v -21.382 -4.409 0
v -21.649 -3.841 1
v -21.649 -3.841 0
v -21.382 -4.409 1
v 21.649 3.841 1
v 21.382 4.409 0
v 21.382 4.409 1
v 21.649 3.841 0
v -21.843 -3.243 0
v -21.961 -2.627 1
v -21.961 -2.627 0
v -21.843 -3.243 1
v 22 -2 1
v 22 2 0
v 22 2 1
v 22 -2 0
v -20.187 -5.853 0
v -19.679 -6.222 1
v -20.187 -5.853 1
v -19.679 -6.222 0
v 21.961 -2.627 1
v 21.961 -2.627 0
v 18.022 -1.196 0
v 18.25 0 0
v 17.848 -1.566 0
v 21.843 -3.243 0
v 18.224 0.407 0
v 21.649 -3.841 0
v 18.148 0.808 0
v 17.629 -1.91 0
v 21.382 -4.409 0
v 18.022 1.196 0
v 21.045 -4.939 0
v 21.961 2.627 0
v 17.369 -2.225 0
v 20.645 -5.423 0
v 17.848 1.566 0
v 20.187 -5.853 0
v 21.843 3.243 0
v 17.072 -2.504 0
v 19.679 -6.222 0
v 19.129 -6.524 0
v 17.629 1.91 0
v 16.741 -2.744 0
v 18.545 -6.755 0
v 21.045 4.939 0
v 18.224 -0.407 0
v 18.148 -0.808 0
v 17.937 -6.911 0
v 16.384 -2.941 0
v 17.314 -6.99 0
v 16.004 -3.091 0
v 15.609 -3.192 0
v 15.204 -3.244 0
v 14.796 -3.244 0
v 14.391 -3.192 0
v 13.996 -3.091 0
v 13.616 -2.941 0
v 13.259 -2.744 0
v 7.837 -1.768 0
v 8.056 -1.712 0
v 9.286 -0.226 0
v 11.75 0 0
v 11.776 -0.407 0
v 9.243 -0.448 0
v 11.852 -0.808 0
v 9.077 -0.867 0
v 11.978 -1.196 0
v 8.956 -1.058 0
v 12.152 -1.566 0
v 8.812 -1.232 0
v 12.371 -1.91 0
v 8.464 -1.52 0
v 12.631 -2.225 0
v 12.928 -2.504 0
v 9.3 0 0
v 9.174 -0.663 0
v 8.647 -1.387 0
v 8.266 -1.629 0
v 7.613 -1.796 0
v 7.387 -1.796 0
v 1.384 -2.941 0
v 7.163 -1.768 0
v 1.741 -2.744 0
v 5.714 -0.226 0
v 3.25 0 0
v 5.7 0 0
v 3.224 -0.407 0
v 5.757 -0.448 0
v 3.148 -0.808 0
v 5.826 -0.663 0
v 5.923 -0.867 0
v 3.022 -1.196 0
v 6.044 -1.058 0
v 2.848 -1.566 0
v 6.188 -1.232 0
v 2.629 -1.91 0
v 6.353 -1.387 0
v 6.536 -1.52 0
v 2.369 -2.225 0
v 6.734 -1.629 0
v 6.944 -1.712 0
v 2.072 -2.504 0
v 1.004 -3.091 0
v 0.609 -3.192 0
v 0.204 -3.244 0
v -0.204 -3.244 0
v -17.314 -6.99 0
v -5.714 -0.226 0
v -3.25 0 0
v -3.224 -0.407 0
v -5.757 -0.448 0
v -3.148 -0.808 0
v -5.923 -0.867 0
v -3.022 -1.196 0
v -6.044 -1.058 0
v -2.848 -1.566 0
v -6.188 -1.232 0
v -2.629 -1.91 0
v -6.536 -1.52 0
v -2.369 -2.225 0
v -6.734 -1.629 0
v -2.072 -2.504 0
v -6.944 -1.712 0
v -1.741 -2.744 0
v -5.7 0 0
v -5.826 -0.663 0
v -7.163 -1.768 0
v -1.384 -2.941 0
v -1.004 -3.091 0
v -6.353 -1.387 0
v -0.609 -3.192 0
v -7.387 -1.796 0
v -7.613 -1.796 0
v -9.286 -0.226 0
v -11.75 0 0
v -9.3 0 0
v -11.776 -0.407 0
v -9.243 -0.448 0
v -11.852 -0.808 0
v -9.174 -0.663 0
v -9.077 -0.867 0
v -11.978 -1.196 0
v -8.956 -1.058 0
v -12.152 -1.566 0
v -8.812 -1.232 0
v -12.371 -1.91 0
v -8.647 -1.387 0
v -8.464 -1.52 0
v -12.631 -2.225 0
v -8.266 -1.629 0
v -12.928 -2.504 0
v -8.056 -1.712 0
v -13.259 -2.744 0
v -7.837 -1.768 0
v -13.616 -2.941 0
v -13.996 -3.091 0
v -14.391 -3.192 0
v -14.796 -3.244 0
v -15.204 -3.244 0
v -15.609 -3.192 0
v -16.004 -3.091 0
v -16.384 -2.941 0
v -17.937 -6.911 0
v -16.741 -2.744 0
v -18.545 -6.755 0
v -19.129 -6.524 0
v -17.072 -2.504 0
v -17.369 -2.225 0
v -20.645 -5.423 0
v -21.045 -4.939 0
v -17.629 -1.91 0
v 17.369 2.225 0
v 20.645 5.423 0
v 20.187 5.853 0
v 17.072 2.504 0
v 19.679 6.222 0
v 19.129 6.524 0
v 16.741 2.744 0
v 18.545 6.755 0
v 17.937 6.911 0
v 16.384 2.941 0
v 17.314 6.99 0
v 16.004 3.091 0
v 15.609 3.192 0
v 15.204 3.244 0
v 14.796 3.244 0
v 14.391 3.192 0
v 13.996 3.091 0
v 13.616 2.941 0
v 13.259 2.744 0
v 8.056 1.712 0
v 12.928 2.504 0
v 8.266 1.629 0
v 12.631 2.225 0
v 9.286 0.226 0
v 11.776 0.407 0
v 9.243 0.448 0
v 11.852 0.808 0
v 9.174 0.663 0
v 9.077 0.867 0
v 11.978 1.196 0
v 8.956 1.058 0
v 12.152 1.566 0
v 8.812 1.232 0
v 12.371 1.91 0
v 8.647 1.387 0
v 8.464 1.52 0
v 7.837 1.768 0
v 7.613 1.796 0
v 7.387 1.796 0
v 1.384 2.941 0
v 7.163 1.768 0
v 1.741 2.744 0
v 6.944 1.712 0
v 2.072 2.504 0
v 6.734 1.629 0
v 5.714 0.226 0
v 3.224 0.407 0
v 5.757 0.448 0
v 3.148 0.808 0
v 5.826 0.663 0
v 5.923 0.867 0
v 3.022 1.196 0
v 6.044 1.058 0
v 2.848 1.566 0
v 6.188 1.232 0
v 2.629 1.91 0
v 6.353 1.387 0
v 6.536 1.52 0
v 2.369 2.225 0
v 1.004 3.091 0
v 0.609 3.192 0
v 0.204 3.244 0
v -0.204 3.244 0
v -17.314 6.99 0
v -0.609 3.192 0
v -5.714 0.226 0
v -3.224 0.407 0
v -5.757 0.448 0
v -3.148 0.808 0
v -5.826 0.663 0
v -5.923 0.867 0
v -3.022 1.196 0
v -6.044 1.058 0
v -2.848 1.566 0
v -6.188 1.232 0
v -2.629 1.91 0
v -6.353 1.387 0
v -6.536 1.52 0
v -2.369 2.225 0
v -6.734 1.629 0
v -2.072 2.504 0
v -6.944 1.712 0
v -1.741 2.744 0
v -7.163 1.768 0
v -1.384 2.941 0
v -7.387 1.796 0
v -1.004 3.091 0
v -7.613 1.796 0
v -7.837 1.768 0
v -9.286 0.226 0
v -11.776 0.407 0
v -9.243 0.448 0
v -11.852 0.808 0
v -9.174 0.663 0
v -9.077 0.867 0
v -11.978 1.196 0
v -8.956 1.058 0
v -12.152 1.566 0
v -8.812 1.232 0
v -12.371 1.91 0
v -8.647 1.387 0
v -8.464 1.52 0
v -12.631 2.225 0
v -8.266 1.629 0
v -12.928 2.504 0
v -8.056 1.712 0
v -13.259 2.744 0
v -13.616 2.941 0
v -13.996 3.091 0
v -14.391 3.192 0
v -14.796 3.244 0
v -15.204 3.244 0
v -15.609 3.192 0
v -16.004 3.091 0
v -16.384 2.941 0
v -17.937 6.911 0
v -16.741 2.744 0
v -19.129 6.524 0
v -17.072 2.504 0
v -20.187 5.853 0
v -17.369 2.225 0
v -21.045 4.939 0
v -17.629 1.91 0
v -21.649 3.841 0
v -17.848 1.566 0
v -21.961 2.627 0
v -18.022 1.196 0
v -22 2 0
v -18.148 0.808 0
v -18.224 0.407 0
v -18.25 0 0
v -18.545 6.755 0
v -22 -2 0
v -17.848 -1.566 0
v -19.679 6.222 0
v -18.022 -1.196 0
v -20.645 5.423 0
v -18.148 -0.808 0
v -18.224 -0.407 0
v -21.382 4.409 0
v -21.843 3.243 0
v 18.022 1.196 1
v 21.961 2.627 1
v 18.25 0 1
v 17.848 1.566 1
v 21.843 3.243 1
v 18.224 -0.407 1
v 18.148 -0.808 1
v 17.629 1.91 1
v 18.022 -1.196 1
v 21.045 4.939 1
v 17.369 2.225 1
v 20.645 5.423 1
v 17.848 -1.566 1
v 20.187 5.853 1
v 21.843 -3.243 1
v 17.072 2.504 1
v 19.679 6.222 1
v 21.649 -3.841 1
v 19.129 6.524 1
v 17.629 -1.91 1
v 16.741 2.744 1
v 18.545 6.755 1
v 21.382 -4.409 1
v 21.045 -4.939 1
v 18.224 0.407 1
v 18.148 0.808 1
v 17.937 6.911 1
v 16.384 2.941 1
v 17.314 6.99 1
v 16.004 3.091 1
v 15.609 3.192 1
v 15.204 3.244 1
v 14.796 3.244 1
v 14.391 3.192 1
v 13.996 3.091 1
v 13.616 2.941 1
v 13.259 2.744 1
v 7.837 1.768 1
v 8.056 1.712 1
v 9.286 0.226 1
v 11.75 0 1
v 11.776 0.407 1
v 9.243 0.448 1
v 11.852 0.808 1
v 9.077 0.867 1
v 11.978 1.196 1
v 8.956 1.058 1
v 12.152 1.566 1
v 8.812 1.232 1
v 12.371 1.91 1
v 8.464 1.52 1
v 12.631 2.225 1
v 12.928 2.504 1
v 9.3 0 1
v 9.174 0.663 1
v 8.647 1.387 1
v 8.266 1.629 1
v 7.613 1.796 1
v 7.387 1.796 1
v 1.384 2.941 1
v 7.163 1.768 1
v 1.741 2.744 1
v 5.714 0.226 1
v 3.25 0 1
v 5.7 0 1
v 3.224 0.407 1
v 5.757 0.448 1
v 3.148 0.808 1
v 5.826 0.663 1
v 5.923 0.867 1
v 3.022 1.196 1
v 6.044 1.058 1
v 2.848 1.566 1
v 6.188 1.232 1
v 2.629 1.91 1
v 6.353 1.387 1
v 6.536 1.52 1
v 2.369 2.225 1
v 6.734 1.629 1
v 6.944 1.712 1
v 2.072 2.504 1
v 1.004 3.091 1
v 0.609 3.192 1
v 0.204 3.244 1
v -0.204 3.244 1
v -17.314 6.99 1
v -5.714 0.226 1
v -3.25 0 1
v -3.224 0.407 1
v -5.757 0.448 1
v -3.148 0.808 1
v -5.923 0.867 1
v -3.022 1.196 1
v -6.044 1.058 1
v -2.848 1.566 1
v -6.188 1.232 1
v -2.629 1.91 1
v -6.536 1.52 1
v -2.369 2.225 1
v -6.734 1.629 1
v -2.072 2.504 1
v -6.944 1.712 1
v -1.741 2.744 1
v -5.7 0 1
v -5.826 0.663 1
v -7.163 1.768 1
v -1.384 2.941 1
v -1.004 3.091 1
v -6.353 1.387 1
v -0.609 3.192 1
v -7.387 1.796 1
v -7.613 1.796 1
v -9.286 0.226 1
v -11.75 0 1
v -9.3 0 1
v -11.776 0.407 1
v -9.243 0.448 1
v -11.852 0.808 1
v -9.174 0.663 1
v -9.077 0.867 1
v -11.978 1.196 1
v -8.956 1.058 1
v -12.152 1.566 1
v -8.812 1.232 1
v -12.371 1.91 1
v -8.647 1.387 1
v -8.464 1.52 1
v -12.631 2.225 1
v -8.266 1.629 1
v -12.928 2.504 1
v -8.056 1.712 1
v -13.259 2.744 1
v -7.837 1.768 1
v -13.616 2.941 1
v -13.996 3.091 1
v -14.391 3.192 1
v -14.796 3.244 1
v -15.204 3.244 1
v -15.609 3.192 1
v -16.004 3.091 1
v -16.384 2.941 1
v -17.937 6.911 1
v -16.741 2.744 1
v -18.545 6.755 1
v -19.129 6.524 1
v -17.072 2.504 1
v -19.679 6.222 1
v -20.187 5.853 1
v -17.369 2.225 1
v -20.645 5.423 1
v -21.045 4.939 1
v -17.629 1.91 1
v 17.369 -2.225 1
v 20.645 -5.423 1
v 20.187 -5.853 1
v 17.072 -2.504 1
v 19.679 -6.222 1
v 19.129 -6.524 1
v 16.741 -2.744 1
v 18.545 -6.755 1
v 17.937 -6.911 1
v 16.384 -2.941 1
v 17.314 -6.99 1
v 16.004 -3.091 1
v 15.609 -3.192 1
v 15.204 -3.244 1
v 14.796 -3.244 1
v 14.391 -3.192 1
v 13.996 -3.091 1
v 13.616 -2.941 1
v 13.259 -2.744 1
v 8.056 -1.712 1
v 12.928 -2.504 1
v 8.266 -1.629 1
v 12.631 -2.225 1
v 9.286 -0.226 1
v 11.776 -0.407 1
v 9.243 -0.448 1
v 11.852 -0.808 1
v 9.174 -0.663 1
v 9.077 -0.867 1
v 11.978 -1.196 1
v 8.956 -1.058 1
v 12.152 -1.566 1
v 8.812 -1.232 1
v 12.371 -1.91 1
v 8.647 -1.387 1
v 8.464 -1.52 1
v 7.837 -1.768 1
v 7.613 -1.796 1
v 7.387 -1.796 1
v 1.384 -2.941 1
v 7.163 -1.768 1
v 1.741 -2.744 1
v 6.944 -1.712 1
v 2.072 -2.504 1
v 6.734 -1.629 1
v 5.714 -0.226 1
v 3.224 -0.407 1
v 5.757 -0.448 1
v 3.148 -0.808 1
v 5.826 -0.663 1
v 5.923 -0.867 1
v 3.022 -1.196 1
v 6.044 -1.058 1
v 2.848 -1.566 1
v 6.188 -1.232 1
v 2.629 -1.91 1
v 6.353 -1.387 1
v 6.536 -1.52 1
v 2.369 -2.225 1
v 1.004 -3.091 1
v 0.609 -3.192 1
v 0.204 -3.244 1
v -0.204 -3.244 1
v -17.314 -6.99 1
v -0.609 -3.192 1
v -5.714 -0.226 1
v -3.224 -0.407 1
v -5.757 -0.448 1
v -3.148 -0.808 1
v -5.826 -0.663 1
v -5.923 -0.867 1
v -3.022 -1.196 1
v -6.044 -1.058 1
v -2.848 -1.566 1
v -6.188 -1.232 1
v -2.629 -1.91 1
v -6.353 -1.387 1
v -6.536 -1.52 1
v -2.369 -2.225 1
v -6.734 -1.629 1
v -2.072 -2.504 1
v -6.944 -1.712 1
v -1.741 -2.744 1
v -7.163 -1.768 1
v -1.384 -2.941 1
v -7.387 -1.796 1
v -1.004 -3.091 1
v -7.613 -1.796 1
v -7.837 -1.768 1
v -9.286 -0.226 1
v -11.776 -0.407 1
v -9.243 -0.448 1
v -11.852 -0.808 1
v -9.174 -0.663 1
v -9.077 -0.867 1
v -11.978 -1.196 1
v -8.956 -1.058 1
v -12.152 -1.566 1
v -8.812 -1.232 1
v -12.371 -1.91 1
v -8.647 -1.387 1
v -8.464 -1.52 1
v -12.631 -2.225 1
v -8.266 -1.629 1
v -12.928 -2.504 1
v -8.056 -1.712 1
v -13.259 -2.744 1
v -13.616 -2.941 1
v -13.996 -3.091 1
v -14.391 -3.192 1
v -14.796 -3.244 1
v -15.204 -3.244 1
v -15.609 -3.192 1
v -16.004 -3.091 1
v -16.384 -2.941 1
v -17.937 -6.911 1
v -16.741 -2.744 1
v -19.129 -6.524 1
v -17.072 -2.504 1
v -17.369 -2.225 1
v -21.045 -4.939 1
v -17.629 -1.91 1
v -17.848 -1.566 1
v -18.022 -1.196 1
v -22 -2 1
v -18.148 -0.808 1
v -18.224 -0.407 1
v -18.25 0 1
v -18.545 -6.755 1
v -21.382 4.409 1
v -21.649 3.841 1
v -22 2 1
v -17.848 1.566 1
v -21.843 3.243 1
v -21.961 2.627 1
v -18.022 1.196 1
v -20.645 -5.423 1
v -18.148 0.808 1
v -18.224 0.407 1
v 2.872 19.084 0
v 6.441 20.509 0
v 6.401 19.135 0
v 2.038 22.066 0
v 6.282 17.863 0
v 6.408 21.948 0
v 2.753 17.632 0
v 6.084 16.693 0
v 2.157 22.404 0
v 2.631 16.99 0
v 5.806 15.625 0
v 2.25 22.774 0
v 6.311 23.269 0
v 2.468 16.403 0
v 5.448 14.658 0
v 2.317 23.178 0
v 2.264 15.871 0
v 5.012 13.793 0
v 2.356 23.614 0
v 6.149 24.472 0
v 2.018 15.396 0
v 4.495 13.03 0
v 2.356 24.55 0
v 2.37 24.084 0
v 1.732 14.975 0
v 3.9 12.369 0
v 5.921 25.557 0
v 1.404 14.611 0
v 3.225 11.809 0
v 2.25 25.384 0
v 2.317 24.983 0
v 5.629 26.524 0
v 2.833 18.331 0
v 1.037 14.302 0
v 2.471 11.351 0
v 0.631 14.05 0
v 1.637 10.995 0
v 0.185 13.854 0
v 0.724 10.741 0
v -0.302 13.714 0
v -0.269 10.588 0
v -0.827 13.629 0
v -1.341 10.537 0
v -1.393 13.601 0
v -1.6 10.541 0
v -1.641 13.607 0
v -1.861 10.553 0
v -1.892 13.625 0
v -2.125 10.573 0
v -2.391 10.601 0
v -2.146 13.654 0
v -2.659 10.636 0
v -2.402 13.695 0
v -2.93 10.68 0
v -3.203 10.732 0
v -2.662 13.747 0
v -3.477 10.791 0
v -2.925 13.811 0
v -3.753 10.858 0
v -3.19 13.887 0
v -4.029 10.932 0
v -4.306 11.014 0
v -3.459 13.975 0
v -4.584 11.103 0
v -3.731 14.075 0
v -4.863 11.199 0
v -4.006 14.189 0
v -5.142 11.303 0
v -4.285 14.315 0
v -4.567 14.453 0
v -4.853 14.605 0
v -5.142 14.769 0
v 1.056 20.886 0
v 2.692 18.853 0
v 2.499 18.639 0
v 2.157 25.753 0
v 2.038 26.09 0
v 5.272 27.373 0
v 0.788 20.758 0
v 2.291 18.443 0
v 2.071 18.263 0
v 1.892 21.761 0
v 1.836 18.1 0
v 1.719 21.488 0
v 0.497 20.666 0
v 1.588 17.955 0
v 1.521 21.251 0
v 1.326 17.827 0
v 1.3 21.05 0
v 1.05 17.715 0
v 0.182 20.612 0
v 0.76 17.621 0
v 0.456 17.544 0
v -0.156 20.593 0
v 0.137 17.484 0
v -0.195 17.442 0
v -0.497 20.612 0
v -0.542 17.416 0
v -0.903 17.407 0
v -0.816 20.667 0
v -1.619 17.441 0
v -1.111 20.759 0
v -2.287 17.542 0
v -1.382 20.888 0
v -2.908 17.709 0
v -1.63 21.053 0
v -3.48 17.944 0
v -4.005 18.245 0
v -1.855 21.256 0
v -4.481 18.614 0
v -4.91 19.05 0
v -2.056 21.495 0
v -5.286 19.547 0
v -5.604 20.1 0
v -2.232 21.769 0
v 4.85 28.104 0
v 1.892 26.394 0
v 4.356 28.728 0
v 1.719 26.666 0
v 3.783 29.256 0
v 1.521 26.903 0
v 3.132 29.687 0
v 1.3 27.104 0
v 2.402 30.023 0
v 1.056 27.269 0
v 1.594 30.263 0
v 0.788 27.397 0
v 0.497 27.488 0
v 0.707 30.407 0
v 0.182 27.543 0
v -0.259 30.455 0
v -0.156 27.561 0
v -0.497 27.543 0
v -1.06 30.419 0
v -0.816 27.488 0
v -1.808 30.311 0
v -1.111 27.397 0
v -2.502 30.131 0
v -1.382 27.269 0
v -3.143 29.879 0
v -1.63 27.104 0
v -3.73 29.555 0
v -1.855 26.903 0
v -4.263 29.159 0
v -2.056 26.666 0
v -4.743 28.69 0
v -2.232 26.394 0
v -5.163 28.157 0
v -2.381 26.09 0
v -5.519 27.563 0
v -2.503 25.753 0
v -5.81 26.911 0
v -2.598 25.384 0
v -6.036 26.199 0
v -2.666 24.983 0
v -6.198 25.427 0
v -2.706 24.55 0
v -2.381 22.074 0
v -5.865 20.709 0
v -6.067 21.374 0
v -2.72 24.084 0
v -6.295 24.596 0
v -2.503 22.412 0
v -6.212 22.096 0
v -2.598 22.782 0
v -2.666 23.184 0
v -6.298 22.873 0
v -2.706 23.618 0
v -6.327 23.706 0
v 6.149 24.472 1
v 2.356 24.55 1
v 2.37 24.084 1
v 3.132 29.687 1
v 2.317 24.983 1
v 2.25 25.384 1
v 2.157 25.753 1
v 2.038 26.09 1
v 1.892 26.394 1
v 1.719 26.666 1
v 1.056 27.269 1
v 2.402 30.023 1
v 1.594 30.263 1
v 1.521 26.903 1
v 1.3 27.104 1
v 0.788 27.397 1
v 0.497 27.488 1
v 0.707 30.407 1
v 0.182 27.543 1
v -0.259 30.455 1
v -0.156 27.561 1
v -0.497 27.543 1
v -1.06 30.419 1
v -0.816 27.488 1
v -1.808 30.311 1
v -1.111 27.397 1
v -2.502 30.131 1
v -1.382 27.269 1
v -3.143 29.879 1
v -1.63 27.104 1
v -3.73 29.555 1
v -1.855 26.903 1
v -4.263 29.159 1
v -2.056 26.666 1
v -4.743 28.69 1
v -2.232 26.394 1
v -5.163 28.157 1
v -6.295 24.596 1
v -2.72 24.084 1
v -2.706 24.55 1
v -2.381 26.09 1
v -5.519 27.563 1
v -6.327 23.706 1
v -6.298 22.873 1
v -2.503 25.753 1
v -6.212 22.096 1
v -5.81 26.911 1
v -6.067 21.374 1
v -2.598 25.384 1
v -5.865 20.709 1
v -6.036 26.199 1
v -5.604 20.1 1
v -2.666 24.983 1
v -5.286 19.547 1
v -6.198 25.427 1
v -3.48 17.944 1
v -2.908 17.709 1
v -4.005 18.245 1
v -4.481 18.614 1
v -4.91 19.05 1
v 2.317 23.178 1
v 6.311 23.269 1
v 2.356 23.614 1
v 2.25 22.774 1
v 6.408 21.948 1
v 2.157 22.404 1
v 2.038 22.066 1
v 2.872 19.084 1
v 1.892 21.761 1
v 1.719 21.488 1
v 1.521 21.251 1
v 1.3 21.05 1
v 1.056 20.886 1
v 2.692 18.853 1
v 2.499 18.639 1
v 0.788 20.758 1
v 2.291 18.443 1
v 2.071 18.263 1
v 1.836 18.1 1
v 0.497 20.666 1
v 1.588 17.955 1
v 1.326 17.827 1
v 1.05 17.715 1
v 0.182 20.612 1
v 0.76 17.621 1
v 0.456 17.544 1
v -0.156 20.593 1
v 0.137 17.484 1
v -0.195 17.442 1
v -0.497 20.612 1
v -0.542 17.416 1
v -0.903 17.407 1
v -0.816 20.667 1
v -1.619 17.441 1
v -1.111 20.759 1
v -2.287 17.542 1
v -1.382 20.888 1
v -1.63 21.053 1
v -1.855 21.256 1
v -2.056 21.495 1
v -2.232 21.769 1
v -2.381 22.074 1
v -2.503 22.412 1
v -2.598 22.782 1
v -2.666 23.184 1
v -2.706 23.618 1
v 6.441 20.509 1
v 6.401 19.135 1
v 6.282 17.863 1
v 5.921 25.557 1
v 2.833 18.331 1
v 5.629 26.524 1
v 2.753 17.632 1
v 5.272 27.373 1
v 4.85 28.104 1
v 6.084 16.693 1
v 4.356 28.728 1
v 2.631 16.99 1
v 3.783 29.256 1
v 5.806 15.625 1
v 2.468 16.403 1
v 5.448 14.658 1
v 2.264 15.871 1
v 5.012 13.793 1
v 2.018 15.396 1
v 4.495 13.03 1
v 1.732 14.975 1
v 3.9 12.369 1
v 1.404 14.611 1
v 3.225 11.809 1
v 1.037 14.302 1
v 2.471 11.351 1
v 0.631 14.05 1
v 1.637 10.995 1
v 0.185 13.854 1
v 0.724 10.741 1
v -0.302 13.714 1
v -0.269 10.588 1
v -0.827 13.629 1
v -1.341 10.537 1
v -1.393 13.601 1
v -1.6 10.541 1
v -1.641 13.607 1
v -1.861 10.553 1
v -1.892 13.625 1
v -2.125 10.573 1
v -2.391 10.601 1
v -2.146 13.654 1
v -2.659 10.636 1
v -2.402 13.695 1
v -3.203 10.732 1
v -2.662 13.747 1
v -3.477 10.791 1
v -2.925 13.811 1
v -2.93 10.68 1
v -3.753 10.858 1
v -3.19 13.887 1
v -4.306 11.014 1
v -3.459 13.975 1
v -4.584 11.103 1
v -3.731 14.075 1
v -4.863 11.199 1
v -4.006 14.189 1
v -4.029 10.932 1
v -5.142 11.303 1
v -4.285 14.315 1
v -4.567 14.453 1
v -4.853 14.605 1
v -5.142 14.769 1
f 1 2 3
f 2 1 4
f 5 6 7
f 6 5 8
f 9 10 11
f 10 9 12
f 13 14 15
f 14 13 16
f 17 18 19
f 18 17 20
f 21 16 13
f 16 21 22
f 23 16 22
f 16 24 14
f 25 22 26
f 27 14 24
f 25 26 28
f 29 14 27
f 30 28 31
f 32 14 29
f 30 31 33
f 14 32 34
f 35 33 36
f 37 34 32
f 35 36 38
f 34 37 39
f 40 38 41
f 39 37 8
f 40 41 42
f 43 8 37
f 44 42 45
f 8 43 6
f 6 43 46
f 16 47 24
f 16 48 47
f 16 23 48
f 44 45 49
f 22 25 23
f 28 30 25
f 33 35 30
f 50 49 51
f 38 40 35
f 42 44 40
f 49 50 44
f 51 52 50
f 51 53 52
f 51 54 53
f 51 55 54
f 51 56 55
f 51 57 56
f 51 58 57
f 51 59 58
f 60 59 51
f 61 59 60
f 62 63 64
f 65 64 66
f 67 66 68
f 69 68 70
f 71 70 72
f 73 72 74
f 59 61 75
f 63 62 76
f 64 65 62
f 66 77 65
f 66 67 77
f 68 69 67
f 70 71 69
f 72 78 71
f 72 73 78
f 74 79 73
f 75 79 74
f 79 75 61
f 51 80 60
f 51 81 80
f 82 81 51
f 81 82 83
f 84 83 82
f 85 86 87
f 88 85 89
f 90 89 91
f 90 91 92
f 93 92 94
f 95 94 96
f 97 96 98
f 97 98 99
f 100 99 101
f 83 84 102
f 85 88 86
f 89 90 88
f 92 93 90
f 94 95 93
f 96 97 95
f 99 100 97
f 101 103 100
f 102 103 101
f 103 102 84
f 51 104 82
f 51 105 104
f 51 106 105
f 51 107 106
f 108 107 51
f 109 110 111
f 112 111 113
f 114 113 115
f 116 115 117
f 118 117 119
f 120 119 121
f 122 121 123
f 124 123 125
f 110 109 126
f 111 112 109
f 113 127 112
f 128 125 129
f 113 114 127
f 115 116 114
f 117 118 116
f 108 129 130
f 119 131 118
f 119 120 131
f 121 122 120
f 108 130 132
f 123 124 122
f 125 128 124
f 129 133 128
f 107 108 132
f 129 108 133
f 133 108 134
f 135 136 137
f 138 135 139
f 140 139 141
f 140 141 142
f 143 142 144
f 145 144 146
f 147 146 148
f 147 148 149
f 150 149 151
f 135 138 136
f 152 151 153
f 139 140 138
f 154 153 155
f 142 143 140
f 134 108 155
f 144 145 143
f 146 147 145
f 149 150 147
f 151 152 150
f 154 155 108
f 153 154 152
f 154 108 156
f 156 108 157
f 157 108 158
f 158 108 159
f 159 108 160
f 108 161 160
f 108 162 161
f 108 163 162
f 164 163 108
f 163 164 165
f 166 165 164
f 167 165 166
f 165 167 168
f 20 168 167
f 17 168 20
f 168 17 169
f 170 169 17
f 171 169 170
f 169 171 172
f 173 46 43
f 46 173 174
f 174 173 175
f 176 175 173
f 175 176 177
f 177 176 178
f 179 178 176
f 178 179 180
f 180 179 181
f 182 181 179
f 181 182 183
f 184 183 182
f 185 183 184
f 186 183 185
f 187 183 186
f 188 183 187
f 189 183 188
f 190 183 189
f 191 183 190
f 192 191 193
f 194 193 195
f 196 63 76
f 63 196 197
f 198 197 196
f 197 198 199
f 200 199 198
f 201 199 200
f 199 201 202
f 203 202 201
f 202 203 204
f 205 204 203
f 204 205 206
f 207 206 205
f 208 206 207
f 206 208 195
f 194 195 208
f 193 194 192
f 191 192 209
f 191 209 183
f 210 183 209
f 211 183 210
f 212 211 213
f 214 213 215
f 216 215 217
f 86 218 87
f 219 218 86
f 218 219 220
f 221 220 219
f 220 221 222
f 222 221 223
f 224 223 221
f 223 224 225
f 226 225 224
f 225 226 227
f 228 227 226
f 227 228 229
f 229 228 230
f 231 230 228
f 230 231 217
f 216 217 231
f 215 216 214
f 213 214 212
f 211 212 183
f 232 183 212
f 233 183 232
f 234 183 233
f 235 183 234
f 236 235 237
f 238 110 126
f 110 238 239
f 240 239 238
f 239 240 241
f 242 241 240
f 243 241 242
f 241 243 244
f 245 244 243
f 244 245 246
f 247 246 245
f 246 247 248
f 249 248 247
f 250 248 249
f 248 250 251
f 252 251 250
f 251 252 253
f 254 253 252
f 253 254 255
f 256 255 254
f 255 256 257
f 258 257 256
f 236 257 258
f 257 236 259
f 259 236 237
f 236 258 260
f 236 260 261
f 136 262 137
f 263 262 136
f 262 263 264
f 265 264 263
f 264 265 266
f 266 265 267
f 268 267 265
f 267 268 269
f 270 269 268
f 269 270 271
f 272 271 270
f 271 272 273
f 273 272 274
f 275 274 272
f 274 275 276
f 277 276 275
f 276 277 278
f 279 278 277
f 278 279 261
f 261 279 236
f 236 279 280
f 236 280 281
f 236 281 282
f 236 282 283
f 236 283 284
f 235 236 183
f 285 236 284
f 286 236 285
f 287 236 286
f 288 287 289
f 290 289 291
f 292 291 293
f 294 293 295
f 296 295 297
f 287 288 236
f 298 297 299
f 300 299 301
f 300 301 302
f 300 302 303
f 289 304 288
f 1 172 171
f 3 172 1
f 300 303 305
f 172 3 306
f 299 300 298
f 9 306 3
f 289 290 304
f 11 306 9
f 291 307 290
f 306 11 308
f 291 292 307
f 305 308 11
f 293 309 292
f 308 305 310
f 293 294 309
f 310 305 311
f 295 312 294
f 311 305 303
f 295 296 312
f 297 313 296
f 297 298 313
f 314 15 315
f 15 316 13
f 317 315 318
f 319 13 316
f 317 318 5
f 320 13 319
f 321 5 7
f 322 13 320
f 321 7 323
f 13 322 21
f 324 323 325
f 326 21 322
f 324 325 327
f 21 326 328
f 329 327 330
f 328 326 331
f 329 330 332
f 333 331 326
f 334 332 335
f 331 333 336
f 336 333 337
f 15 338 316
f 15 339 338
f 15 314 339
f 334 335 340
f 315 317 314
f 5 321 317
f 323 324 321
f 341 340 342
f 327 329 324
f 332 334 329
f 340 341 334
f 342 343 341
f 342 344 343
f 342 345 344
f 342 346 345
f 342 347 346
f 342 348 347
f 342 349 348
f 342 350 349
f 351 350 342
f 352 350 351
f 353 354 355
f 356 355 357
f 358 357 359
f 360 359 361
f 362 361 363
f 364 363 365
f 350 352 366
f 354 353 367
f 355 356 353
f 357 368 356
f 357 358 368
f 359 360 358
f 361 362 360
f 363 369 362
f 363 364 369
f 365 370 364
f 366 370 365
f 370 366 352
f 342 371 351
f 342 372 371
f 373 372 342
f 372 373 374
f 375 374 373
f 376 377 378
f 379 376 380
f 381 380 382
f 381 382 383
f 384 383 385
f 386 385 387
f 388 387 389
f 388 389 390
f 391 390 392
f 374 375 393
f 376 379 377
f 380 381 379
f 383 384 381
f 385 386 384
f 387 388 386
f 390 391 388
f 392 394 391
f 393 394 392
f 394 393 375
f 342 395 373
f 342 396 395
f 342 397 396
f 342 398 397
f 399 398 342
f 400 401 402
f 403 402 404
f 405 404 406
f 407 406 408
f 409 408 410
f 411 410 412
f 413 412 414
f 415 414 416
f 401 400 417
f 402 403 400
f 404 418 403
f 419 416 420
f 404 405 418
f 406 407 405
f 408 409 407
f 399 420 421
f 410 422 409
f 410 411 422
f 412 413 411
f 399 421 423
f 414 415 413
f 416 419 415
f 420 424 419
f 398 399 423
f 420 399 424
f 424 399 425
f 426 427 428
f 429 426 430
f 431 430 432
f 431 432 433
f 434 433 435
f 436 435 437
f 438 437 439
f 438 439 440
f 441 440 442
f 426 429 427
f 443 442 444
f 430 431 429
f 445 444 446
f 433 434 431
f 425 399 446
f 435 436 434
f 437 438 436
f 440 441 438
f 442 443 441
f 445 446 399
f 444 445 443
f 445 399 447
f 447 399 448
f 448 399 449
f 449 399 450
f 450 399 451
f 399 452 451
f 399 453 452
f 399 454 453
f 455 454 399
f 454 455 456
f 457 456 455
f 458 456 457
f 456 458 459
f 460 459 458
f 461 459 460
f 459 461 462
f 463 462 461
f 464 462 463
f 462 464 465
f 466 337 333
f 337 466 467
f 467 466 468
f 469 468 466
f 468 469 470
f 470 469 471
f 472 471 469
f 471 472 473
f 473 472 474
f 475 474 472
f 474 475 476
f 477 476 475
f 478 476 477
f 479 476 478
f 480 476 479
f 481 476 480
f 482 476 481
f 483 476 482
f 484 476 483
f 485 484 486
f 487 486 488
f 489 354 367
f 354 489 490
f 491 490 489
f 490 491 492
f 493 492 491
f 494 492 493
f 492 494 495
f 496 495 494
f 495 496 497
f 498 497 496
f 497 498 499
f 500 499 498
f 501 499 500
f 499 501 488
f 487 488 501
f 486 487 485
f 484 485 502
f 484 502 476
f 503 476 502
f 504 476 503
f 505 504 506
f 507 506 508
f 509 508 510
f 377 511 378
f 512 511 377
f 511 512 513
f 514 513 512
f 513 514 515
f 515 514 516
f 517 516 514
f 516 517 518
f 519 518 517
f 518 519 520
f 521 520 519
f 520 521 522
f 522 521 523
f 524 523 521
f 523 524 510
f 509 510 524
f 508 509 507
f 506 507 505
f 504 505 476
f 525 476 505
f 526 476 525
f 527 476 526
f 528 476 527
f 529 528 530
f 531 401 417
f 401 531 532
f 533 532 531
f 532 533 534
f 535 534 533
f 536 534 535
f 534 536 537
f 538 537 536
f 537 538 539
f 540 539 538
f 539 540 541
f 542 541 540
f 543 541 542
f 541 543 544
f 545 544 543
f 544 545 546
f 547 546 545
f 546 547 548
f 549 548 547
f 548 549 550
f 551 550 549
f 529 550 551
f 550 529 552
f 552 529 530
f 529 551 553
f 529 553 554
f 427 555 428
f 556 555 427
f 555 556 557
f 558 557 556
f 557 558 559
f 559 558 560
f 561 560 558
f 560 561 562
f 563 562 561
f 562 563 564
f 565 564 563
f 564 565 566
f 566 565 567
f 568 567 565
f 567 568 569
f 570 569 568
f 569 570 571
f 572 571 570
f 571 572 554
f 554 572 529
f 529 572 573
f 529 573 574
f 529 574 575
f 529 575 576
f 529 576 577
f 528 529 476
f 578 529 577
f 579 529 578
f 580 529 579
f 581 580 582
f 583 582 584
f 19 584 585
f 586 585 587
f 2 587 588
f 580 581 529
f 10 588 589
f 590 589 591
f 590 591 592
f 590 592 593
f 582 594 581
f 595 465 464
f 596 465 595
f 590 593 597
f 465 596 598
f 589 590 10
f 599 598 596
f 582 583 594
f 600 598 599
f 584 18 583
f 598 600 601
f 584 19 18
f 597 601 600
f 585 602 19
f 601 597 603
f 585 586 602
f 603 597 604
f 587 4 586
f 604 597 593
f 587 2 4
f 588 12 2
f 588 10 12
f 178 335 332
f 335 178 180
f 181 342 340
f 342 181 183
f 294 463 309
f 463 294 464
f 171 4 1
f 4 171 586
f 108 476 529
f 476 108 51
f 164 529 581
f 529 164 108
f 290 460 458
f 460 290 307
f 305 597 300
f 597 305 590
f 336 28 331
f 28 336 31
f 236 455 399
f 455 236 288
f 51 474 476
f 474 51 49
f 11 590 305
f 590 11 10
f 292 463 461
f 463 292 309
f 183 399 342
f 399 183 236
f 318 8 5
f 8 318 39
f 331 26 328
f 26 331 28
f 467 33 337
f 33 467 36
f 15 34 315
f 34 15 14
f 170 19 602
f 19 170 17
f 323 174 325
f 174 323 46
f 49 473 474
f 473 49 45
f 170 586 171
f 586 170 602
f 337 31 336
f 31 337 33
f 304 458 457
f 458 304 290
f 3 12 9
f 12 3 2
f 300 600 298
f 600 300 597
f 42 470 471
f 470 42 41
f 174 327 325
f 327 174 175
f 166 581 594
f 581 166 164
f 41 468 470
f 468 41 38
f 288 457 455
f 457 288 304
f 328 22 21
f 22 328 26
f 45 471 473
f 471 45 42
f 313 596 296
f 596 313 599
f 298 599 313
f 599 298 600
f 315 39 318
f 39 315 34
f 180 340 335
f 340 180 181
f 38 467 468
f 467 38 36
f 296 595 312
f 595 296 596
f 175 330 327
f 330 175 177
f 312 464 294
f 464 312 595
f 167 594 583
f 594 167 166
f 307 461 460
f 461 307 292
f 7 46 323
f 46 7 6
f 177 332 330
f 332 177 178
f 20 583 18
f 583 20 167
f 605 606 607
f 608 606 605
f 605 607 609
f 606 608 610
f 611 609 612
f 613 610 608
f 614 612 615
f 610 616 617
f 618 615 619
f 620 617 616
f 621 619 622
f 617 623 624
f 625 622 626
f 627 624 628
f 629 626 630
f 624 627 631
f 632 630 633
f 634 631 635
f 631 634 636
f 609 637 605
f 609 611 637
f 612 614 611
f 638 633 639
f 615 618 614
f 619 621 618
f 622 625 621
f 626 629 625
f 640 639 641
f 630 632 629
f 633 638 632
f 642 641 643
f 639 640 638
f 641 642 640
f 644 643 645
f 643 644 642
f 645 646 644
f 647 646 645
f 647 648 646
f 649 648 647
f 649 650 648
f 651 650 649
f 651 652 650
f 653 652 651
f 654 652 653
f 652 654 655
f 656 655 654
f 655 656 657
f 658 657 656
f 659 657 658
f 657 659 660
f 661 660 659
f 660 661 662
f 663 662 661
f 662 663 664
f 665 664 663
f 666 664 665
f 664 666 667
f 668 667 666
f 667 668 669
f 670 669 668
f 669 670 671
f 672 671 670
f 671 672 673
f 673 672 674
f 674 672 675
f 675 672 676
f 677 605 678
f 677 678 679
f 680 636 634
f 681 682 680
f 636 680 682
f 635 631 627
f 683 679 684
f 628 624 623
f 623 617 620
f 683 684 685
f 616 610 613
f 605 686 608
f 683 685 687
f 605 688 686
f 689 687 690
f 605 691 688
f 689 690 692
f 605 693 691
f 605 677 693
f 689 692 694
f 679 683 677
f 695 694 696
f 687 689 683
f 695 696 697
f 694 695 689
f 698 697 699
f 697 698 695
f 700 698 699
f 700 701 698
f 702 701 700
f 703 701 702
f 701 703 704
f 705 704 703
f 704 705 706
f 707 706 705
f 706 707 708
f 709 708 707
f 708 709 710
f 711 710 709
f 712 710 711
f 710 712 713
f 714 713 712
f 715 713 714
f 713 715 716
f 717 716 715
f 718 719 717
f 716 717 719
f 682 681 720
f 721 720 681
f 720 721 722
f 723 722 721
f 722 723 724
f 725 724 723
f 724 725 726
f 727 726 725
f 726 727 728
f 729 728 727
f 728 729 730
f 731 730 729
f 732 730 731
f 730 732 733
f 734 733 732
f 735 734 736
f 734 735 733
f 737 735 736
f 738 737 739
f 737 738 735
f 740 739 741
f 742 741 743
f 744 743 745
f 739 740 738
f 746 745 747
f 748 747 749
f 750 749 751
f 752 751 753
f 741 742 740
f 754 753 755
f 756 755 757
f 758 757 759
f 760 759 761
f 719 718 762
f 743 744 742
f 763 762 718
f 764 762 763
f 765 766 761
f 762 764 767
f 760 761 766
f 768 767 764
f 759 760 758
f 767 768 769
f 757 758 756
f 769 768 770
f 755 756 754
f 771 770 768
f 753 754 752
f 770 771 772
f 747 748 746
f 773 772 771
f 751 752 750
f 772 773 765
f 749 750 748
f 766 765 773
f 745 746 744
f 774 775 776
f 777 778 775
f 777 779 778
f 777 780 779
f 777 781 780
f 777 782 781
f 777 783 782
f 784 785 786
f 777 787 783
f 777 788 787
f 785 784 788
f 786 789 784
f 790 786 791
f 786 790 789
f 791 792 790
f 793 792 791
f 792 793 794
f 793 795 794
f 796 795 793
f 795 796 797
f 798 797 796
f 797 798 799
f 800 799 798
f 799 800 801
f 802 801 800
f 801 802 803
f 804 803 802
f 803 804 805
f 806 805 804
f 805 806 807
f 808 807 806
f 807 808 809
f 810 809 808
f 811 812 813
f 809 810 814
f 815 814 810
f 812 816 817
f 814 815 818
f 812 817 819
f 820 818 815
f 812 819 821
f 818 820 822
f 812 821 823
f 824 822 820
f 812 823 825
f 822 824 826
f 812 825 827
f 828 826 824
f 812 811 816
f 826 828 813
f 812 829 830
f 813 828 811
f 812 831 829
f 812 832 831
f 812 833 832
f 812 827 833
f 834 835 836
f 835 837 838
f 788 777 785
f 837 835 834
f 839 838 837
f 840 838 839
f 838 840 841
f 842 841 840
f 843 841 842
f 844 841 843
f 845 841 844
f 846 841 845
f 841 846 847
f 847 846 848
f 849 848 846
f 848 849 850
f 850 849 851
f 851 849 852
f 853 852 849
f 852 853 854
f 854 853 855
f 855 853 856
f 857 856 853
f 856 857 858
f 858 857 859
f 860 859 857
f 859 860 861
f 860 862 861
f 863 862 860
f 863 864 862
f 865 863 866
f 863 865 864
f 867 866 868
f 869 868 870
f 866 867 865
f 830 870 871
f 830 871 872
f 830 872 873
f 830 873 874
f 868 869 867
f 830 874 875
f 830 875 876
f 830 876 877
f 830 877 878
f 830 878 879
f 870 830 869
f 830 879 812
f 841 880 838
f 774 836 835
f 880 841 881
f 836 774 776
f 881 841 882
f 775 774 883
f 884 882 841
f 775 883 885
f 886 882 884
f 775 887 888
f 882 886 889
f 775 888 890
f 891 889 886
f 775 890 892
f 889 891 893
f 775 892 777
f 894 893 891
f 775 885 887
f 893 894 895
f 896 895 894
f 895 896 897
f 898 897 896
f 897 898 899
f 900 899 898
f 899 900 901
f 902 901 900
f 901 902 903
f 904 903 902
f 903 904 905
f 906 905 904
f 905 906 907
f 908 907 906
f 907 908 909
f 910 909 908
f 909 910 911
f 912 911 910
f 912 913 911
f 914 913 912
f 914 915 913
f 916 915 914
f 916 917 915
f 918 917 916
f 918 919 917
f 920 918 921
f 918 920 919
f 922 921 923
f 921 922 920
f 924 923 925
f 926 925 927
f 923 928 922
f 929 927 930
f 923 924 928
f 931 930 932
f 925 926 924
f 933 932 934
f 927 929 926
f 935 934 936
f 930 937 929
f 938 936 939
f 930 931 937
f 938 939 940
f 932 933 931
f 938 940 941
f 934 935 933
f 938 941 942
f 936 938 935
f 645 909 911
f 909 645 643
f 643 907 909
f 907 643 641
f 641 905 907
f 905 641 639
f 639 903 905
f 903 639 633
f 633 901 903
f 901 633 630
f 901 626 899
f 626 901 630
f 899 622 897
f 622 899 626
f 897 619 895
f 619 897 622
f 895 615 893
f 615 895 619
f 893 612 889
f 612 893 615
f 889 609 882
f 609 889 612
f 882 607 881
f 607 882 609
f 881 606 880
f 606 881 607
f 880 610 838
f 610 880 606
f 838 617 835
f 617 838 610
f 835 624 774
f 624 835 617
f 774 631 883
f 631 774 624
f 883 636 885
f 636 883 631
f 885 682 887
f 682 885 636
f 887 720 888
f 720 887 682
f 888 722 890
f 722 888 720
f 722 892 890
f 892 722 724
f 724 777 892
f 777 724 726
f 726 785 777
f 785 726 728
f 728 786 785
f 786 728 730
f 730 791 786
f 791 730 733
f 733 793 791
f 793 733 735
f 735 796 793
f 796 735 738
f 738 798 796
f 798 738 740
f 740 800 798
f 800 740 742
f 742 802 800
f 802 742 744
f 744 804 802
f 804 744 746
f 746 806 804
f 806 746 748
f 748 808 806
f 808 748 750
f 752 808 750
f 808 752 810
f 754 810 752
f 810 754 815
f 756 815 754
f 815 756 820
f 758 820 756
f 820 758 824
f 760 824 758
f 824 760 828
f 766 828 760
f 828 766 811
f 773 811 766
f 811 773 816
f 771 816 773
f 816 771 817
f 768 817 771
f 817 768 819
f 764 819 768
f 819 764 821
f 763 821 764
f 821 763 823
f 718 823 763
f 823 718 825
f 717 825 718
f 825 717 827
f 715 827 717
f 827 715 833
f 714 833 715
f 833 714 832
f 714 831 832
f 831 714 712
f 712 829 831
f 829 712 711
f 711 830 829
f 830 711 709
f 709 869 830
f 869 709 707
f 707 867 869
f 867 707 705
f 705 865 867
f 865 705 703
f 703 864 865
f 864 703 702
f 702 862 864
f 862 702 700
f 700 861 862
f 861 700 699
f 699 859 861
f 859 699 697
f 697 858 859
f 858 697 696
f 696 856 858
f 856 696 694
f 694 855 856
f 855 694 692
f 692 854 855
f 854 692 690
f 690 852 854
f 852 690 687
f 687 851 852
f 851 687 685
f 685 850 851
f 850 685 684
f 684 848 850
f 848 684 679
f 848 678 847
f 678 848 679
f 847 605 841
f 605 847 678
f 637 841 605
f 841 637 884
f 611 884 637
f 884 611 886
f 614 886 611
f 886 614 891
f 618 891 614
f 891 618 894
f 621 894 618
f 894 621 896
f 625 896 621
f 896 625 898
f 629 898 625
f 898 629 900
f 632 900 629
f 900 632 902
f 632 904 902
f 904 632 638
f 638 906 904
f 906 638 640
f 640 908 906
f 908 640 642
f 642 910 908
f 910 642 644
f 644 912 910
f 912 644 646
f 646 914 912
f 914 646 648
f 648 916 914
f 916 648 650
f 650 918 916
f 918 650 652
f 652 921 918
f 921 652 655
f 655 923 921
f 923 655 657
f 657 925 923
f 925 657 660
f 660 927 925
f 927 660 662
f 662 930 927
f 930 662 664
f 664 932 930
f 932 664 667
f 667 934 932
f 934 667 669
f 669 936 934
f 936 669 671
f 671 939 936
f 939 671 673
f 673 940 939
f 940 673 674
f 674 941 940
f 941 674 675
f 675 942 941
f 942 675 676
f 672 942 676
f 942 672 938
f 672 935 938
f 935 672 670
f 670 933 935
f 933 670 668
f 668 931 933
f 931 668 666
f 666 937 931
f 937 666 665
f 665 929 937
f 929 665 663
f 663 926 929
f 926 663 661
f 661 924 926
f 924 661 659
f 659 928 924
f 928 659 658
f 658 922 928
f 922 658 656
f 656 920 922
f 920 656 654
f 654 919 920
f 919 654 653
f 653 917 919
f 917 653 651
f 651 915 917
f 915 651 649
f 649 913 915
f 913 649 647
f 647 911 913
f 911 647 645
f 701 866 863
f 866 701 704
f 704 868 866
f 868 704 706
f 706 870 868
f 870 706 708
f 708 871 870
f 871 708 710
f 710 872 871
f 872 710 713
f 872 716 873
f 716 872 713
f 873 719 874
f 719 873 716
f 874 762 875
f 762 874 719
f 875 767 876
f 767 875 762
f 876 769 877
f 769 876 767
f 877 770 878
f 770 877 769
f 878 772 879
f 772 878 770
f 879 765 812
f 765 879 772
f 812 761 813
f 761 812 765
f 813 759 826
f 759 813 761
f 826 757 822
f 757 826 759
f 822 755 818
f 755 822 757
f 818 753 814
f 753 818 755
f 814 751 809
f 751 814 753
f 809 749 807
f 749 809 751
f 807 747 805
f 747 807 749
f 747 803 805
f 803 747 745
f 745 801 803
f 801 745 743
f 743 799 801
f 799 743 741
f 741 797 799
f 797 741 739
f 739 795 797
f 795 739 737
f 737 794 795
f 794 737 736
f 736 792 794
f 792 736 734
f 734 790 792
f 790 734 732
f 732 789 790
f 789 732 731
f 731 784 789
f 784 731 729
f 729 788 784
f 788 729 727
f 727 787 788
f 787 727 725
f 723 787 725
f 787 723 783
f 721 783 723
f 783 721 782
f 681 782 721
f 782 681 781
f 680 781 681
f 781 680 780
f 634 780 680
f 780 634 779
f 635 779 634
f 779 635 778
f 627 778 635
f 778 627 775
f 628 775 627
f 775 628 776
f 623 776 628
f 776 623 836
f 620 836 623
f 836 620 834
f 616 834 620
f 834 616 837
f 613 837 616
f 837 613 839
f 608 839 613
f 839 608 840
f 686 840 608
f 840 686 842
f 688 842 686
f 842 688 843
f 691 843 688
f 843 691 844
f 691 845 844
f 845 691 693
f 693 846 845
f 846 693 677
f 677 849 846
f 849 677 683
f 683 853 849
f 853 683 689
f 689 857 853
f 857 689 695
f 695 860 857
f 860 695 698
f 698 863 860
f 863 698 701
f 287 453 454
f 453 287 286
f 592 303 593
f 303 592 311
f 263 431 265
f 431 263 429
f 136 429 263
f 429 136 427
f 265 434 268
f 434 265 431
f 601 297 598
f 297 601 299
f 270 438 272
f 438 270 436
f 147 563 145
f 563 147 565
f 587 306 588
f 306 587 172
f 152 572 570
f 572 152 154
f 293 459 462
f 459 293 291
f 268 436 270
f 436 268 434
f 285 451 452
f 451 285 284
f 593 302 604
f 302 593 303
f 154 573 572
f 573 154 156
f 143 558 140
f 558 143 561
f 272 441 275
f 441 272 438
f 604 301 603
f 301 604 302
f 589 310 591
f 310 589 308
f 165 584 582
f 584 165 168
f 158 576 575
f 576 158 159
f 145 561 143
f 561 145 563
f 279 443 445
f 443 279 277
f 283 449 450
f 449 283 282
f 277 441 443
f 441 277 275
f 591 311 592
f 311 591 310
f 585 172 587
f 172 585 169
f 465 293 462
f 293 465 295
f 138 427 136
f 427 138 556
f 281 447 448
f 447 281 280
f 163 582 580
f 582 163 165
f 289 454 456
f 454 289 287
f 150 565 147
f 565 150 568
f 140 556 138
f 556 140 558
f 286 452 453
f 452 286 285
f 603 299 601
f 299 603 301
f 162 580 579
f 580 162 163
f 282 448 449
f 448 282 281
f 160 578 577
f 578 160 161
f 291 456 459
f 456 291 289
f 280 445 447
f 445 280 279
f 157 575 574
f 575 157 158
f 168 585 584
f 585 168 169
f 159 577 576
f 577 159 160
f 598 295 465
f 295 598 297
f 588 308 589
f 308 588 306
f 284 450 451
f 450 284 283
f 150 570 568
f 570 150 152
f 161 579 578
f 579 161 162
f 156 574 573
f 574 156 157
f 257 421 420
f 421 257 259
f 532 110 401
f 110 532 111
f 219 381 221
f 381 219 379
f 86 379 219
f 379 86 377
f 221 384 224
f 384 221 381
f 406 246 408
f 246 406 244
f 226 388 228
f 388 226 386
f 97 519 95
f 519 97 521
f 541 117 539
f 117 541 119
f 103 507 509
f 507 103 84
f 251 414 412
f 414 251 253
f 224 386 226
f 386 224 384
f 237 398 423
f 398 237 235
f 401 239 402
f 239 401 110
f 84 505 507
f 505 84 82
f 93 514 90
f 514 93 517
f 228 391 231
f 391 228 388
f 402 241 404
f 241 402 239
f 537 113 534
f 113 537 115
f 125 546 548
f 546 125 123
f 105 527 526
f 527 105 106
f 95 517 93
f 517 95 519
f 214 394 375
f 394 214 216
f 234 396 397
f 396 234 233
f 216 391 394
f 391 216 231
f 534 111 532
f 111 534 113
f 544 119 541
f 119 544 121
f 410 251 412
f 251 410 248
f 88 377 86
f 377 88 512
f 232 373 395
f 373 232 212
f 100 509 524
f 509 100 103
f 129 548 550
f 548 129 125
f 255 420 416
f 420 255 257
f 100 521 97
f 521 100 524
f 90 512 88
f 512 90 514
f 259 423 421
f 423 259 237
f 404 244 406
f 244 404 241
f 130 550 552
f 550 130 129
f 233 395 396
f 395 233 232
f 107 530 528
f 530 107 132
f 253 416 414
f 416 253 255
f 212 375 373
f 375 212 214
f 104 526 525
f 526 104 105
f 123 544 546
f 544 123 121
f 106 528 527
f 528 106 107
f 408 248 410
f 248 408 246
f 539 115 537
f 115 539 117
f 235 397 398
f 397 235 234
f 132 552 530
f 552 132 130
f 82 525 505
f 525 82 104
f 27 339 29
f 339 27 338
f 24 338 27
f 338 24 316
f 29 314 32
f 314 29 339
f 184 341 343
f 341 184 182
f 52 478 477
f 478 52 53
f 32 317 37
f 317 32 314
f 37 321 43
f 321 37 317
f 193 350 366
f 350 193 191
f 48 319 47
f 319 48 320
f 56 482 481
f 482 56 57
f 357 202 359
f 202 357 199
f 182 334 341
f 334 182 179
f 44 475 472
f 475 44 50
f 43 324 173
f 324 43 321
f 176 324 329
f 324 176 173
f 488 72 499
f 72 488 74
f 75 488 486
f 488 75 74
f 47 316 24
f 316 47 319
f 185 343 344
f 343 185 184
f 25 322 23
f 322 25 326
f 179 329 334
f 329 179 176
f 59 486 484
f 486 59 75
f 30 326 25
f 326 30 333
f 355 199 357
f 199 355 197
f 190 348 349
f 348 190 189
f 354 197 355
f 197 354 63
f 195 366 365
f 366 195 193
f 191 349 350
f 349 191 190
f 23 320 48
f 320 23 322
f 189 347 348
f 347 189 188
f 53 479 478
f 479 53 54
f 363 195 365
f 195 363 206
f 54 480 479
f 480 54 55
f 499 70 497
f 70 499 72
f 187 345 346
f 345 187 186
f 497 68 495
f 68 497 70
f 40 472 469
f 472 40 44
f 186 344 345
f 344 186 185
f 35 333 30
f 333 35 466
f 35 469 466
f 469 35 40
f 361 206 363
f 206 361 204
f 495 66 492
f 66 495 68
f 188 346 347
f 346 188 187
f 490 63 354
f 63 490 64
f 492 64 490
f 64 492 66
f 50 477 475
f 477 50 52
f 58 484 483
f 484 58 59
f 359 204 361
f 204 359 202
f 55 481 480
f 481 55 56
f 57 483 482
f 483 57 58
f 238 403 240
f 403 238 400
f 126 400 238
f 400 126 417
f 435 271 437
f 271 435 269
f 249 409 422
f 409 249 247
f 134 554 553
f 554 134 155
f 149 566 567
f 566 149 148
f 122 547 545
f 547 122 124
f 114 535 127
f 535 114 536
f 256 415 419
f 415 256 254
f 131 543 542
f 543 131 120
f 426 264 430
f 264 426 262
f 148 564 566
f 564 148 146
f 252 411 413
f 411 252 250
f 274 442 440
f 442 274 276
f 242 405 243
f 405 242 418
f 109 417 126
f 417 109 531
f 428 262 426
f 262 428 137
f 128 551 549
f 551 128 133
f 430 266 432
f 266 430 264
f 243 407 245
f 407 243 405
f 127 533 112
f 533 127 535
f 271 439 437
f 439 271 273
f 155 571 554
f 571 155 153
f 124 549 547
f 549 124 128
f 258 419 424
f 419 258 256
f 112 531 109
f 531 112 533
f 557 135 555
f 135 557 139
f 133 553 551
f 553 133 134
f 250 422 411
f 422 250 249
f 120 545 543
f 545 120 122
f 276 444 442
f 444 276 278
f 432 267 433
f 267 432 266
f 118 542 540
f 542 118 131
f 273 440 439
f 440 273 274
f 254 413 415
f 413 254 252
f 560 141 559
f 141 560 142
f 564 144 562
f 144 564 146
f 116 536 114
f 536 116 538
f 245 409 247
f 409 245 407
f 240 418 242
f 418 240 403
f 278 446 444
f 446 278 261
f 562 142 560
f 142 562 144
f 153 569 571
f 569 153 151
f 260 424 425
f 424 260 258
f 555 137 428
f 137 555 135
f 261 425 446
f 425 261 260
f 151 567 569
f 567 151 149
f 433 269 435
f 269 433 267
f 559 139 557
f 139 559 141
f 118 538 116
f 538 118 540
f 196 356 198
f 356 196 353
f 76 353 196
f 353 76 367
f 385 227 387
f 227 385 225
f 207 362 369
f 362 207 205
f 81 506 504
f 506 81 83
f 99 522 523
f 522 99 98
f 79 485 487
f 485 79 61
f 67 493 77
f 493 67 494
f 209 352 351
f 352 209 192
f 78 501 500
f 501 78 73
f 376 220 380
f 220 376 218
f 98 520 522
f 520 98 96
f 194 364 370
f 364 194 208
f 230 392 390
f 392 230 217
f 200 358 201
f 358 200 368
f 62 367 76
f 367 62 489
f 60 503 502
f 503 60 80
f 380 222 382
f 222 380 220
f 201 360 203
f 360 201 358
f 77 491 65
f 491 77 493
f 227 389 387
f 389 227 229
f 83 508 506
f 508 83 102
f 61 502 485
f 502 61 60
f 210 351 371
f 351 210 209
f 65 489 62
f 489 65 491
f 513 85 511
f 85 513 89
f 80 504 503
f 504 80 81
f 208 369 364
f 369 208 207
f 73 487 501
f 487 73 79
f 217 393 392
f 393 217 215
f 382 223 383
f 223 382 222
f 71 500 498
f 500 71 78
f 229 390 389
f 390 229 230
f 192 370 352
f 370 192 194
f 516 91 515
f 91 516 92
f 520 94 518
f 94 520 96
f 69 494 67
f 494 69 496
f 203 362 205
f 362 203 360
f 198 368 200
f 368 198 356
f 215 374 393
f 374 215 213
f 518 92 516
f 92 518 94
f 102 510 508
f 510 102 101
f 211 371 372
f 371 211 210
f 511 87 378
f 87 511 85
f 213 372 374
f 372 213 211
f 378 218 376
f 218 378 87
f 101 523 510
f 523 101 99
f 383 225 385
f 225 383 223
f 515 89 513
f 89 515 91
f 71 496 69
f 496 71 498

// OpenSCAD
$fn = 50;


difference() {
	union() {
		hull() {
			translate(v = [-17.0000000000, 2.0000000000, 0]) {
				cylinder(h = 1, r = 5);
			}
			translate(v = [17.0000000000, 2.0000000000, 0]) {
				cylinder(h = 1, r = 5);
			}
			translate(v = [-17.0000000000, -2.0000000000, 0]) {
				cylinder(h = 1, r = 5);
			}
			translate(v = [17.0000000000, -2.0000000000, 0]) {
				cylinder(h = 1, r = 5);
			}
		}
		translate(v = [0, 30.0000000000, 0]) {
			linear_extrude(height = 1) {
				text(font = "DejaVu Sans Mono:style=Bold", halign = "center", size = 19.0000000000, text = "9", valign = "top");
			}
		}
	}
	union() {
		translate(v = [-15.0000000000, 0.0000000000, 0]) {
			translate(v = [0, 0, -100]) {
				cylinder(h = 200, r = 3.2500000000);
			}
		}
		translate(v = [0, 0, -100]) {
			cylinder(h = 200, r = 3.2500000000);
		}
		translate(v = [15.0000000000, 0.0000000000, 0]) {
			translate(v = [0, 0, -100]) {
				cylinder(h = 200, r = 3.2500000000);
			}
		}
		translate(v = [-15.0000000000, 0.0000000000, 0]) {
			translate(v = [0, 0, -100]) {
				cylinder(h = 200, r = 1.8000000000);
			}
		}
		translate(v = [-7.5000000000, 0.0000000000, 0]) {
			translate(v = [0, 0, -100]) {
				cylinder(h = 200, r = 1.8000000000);
			}
		}
		translate(v = [0, 0, -100]) {
			cylinder(h = 200, r = 1.8000000000);
		}
		translate(v = [7.5000000000, 0.0000000000, 0]) {
			translate(v = [0, 0, -100]) {
				cylinder(h = 200, r = 1.8000000000);
			}
		}
		translate(v = [15.0000000000, 0.0000000000, 0]) {
			translate(v = [0, 0, -100]) {
				cylinder(h = 200, r = 1.8000000000);
			}
		}
	}
}
